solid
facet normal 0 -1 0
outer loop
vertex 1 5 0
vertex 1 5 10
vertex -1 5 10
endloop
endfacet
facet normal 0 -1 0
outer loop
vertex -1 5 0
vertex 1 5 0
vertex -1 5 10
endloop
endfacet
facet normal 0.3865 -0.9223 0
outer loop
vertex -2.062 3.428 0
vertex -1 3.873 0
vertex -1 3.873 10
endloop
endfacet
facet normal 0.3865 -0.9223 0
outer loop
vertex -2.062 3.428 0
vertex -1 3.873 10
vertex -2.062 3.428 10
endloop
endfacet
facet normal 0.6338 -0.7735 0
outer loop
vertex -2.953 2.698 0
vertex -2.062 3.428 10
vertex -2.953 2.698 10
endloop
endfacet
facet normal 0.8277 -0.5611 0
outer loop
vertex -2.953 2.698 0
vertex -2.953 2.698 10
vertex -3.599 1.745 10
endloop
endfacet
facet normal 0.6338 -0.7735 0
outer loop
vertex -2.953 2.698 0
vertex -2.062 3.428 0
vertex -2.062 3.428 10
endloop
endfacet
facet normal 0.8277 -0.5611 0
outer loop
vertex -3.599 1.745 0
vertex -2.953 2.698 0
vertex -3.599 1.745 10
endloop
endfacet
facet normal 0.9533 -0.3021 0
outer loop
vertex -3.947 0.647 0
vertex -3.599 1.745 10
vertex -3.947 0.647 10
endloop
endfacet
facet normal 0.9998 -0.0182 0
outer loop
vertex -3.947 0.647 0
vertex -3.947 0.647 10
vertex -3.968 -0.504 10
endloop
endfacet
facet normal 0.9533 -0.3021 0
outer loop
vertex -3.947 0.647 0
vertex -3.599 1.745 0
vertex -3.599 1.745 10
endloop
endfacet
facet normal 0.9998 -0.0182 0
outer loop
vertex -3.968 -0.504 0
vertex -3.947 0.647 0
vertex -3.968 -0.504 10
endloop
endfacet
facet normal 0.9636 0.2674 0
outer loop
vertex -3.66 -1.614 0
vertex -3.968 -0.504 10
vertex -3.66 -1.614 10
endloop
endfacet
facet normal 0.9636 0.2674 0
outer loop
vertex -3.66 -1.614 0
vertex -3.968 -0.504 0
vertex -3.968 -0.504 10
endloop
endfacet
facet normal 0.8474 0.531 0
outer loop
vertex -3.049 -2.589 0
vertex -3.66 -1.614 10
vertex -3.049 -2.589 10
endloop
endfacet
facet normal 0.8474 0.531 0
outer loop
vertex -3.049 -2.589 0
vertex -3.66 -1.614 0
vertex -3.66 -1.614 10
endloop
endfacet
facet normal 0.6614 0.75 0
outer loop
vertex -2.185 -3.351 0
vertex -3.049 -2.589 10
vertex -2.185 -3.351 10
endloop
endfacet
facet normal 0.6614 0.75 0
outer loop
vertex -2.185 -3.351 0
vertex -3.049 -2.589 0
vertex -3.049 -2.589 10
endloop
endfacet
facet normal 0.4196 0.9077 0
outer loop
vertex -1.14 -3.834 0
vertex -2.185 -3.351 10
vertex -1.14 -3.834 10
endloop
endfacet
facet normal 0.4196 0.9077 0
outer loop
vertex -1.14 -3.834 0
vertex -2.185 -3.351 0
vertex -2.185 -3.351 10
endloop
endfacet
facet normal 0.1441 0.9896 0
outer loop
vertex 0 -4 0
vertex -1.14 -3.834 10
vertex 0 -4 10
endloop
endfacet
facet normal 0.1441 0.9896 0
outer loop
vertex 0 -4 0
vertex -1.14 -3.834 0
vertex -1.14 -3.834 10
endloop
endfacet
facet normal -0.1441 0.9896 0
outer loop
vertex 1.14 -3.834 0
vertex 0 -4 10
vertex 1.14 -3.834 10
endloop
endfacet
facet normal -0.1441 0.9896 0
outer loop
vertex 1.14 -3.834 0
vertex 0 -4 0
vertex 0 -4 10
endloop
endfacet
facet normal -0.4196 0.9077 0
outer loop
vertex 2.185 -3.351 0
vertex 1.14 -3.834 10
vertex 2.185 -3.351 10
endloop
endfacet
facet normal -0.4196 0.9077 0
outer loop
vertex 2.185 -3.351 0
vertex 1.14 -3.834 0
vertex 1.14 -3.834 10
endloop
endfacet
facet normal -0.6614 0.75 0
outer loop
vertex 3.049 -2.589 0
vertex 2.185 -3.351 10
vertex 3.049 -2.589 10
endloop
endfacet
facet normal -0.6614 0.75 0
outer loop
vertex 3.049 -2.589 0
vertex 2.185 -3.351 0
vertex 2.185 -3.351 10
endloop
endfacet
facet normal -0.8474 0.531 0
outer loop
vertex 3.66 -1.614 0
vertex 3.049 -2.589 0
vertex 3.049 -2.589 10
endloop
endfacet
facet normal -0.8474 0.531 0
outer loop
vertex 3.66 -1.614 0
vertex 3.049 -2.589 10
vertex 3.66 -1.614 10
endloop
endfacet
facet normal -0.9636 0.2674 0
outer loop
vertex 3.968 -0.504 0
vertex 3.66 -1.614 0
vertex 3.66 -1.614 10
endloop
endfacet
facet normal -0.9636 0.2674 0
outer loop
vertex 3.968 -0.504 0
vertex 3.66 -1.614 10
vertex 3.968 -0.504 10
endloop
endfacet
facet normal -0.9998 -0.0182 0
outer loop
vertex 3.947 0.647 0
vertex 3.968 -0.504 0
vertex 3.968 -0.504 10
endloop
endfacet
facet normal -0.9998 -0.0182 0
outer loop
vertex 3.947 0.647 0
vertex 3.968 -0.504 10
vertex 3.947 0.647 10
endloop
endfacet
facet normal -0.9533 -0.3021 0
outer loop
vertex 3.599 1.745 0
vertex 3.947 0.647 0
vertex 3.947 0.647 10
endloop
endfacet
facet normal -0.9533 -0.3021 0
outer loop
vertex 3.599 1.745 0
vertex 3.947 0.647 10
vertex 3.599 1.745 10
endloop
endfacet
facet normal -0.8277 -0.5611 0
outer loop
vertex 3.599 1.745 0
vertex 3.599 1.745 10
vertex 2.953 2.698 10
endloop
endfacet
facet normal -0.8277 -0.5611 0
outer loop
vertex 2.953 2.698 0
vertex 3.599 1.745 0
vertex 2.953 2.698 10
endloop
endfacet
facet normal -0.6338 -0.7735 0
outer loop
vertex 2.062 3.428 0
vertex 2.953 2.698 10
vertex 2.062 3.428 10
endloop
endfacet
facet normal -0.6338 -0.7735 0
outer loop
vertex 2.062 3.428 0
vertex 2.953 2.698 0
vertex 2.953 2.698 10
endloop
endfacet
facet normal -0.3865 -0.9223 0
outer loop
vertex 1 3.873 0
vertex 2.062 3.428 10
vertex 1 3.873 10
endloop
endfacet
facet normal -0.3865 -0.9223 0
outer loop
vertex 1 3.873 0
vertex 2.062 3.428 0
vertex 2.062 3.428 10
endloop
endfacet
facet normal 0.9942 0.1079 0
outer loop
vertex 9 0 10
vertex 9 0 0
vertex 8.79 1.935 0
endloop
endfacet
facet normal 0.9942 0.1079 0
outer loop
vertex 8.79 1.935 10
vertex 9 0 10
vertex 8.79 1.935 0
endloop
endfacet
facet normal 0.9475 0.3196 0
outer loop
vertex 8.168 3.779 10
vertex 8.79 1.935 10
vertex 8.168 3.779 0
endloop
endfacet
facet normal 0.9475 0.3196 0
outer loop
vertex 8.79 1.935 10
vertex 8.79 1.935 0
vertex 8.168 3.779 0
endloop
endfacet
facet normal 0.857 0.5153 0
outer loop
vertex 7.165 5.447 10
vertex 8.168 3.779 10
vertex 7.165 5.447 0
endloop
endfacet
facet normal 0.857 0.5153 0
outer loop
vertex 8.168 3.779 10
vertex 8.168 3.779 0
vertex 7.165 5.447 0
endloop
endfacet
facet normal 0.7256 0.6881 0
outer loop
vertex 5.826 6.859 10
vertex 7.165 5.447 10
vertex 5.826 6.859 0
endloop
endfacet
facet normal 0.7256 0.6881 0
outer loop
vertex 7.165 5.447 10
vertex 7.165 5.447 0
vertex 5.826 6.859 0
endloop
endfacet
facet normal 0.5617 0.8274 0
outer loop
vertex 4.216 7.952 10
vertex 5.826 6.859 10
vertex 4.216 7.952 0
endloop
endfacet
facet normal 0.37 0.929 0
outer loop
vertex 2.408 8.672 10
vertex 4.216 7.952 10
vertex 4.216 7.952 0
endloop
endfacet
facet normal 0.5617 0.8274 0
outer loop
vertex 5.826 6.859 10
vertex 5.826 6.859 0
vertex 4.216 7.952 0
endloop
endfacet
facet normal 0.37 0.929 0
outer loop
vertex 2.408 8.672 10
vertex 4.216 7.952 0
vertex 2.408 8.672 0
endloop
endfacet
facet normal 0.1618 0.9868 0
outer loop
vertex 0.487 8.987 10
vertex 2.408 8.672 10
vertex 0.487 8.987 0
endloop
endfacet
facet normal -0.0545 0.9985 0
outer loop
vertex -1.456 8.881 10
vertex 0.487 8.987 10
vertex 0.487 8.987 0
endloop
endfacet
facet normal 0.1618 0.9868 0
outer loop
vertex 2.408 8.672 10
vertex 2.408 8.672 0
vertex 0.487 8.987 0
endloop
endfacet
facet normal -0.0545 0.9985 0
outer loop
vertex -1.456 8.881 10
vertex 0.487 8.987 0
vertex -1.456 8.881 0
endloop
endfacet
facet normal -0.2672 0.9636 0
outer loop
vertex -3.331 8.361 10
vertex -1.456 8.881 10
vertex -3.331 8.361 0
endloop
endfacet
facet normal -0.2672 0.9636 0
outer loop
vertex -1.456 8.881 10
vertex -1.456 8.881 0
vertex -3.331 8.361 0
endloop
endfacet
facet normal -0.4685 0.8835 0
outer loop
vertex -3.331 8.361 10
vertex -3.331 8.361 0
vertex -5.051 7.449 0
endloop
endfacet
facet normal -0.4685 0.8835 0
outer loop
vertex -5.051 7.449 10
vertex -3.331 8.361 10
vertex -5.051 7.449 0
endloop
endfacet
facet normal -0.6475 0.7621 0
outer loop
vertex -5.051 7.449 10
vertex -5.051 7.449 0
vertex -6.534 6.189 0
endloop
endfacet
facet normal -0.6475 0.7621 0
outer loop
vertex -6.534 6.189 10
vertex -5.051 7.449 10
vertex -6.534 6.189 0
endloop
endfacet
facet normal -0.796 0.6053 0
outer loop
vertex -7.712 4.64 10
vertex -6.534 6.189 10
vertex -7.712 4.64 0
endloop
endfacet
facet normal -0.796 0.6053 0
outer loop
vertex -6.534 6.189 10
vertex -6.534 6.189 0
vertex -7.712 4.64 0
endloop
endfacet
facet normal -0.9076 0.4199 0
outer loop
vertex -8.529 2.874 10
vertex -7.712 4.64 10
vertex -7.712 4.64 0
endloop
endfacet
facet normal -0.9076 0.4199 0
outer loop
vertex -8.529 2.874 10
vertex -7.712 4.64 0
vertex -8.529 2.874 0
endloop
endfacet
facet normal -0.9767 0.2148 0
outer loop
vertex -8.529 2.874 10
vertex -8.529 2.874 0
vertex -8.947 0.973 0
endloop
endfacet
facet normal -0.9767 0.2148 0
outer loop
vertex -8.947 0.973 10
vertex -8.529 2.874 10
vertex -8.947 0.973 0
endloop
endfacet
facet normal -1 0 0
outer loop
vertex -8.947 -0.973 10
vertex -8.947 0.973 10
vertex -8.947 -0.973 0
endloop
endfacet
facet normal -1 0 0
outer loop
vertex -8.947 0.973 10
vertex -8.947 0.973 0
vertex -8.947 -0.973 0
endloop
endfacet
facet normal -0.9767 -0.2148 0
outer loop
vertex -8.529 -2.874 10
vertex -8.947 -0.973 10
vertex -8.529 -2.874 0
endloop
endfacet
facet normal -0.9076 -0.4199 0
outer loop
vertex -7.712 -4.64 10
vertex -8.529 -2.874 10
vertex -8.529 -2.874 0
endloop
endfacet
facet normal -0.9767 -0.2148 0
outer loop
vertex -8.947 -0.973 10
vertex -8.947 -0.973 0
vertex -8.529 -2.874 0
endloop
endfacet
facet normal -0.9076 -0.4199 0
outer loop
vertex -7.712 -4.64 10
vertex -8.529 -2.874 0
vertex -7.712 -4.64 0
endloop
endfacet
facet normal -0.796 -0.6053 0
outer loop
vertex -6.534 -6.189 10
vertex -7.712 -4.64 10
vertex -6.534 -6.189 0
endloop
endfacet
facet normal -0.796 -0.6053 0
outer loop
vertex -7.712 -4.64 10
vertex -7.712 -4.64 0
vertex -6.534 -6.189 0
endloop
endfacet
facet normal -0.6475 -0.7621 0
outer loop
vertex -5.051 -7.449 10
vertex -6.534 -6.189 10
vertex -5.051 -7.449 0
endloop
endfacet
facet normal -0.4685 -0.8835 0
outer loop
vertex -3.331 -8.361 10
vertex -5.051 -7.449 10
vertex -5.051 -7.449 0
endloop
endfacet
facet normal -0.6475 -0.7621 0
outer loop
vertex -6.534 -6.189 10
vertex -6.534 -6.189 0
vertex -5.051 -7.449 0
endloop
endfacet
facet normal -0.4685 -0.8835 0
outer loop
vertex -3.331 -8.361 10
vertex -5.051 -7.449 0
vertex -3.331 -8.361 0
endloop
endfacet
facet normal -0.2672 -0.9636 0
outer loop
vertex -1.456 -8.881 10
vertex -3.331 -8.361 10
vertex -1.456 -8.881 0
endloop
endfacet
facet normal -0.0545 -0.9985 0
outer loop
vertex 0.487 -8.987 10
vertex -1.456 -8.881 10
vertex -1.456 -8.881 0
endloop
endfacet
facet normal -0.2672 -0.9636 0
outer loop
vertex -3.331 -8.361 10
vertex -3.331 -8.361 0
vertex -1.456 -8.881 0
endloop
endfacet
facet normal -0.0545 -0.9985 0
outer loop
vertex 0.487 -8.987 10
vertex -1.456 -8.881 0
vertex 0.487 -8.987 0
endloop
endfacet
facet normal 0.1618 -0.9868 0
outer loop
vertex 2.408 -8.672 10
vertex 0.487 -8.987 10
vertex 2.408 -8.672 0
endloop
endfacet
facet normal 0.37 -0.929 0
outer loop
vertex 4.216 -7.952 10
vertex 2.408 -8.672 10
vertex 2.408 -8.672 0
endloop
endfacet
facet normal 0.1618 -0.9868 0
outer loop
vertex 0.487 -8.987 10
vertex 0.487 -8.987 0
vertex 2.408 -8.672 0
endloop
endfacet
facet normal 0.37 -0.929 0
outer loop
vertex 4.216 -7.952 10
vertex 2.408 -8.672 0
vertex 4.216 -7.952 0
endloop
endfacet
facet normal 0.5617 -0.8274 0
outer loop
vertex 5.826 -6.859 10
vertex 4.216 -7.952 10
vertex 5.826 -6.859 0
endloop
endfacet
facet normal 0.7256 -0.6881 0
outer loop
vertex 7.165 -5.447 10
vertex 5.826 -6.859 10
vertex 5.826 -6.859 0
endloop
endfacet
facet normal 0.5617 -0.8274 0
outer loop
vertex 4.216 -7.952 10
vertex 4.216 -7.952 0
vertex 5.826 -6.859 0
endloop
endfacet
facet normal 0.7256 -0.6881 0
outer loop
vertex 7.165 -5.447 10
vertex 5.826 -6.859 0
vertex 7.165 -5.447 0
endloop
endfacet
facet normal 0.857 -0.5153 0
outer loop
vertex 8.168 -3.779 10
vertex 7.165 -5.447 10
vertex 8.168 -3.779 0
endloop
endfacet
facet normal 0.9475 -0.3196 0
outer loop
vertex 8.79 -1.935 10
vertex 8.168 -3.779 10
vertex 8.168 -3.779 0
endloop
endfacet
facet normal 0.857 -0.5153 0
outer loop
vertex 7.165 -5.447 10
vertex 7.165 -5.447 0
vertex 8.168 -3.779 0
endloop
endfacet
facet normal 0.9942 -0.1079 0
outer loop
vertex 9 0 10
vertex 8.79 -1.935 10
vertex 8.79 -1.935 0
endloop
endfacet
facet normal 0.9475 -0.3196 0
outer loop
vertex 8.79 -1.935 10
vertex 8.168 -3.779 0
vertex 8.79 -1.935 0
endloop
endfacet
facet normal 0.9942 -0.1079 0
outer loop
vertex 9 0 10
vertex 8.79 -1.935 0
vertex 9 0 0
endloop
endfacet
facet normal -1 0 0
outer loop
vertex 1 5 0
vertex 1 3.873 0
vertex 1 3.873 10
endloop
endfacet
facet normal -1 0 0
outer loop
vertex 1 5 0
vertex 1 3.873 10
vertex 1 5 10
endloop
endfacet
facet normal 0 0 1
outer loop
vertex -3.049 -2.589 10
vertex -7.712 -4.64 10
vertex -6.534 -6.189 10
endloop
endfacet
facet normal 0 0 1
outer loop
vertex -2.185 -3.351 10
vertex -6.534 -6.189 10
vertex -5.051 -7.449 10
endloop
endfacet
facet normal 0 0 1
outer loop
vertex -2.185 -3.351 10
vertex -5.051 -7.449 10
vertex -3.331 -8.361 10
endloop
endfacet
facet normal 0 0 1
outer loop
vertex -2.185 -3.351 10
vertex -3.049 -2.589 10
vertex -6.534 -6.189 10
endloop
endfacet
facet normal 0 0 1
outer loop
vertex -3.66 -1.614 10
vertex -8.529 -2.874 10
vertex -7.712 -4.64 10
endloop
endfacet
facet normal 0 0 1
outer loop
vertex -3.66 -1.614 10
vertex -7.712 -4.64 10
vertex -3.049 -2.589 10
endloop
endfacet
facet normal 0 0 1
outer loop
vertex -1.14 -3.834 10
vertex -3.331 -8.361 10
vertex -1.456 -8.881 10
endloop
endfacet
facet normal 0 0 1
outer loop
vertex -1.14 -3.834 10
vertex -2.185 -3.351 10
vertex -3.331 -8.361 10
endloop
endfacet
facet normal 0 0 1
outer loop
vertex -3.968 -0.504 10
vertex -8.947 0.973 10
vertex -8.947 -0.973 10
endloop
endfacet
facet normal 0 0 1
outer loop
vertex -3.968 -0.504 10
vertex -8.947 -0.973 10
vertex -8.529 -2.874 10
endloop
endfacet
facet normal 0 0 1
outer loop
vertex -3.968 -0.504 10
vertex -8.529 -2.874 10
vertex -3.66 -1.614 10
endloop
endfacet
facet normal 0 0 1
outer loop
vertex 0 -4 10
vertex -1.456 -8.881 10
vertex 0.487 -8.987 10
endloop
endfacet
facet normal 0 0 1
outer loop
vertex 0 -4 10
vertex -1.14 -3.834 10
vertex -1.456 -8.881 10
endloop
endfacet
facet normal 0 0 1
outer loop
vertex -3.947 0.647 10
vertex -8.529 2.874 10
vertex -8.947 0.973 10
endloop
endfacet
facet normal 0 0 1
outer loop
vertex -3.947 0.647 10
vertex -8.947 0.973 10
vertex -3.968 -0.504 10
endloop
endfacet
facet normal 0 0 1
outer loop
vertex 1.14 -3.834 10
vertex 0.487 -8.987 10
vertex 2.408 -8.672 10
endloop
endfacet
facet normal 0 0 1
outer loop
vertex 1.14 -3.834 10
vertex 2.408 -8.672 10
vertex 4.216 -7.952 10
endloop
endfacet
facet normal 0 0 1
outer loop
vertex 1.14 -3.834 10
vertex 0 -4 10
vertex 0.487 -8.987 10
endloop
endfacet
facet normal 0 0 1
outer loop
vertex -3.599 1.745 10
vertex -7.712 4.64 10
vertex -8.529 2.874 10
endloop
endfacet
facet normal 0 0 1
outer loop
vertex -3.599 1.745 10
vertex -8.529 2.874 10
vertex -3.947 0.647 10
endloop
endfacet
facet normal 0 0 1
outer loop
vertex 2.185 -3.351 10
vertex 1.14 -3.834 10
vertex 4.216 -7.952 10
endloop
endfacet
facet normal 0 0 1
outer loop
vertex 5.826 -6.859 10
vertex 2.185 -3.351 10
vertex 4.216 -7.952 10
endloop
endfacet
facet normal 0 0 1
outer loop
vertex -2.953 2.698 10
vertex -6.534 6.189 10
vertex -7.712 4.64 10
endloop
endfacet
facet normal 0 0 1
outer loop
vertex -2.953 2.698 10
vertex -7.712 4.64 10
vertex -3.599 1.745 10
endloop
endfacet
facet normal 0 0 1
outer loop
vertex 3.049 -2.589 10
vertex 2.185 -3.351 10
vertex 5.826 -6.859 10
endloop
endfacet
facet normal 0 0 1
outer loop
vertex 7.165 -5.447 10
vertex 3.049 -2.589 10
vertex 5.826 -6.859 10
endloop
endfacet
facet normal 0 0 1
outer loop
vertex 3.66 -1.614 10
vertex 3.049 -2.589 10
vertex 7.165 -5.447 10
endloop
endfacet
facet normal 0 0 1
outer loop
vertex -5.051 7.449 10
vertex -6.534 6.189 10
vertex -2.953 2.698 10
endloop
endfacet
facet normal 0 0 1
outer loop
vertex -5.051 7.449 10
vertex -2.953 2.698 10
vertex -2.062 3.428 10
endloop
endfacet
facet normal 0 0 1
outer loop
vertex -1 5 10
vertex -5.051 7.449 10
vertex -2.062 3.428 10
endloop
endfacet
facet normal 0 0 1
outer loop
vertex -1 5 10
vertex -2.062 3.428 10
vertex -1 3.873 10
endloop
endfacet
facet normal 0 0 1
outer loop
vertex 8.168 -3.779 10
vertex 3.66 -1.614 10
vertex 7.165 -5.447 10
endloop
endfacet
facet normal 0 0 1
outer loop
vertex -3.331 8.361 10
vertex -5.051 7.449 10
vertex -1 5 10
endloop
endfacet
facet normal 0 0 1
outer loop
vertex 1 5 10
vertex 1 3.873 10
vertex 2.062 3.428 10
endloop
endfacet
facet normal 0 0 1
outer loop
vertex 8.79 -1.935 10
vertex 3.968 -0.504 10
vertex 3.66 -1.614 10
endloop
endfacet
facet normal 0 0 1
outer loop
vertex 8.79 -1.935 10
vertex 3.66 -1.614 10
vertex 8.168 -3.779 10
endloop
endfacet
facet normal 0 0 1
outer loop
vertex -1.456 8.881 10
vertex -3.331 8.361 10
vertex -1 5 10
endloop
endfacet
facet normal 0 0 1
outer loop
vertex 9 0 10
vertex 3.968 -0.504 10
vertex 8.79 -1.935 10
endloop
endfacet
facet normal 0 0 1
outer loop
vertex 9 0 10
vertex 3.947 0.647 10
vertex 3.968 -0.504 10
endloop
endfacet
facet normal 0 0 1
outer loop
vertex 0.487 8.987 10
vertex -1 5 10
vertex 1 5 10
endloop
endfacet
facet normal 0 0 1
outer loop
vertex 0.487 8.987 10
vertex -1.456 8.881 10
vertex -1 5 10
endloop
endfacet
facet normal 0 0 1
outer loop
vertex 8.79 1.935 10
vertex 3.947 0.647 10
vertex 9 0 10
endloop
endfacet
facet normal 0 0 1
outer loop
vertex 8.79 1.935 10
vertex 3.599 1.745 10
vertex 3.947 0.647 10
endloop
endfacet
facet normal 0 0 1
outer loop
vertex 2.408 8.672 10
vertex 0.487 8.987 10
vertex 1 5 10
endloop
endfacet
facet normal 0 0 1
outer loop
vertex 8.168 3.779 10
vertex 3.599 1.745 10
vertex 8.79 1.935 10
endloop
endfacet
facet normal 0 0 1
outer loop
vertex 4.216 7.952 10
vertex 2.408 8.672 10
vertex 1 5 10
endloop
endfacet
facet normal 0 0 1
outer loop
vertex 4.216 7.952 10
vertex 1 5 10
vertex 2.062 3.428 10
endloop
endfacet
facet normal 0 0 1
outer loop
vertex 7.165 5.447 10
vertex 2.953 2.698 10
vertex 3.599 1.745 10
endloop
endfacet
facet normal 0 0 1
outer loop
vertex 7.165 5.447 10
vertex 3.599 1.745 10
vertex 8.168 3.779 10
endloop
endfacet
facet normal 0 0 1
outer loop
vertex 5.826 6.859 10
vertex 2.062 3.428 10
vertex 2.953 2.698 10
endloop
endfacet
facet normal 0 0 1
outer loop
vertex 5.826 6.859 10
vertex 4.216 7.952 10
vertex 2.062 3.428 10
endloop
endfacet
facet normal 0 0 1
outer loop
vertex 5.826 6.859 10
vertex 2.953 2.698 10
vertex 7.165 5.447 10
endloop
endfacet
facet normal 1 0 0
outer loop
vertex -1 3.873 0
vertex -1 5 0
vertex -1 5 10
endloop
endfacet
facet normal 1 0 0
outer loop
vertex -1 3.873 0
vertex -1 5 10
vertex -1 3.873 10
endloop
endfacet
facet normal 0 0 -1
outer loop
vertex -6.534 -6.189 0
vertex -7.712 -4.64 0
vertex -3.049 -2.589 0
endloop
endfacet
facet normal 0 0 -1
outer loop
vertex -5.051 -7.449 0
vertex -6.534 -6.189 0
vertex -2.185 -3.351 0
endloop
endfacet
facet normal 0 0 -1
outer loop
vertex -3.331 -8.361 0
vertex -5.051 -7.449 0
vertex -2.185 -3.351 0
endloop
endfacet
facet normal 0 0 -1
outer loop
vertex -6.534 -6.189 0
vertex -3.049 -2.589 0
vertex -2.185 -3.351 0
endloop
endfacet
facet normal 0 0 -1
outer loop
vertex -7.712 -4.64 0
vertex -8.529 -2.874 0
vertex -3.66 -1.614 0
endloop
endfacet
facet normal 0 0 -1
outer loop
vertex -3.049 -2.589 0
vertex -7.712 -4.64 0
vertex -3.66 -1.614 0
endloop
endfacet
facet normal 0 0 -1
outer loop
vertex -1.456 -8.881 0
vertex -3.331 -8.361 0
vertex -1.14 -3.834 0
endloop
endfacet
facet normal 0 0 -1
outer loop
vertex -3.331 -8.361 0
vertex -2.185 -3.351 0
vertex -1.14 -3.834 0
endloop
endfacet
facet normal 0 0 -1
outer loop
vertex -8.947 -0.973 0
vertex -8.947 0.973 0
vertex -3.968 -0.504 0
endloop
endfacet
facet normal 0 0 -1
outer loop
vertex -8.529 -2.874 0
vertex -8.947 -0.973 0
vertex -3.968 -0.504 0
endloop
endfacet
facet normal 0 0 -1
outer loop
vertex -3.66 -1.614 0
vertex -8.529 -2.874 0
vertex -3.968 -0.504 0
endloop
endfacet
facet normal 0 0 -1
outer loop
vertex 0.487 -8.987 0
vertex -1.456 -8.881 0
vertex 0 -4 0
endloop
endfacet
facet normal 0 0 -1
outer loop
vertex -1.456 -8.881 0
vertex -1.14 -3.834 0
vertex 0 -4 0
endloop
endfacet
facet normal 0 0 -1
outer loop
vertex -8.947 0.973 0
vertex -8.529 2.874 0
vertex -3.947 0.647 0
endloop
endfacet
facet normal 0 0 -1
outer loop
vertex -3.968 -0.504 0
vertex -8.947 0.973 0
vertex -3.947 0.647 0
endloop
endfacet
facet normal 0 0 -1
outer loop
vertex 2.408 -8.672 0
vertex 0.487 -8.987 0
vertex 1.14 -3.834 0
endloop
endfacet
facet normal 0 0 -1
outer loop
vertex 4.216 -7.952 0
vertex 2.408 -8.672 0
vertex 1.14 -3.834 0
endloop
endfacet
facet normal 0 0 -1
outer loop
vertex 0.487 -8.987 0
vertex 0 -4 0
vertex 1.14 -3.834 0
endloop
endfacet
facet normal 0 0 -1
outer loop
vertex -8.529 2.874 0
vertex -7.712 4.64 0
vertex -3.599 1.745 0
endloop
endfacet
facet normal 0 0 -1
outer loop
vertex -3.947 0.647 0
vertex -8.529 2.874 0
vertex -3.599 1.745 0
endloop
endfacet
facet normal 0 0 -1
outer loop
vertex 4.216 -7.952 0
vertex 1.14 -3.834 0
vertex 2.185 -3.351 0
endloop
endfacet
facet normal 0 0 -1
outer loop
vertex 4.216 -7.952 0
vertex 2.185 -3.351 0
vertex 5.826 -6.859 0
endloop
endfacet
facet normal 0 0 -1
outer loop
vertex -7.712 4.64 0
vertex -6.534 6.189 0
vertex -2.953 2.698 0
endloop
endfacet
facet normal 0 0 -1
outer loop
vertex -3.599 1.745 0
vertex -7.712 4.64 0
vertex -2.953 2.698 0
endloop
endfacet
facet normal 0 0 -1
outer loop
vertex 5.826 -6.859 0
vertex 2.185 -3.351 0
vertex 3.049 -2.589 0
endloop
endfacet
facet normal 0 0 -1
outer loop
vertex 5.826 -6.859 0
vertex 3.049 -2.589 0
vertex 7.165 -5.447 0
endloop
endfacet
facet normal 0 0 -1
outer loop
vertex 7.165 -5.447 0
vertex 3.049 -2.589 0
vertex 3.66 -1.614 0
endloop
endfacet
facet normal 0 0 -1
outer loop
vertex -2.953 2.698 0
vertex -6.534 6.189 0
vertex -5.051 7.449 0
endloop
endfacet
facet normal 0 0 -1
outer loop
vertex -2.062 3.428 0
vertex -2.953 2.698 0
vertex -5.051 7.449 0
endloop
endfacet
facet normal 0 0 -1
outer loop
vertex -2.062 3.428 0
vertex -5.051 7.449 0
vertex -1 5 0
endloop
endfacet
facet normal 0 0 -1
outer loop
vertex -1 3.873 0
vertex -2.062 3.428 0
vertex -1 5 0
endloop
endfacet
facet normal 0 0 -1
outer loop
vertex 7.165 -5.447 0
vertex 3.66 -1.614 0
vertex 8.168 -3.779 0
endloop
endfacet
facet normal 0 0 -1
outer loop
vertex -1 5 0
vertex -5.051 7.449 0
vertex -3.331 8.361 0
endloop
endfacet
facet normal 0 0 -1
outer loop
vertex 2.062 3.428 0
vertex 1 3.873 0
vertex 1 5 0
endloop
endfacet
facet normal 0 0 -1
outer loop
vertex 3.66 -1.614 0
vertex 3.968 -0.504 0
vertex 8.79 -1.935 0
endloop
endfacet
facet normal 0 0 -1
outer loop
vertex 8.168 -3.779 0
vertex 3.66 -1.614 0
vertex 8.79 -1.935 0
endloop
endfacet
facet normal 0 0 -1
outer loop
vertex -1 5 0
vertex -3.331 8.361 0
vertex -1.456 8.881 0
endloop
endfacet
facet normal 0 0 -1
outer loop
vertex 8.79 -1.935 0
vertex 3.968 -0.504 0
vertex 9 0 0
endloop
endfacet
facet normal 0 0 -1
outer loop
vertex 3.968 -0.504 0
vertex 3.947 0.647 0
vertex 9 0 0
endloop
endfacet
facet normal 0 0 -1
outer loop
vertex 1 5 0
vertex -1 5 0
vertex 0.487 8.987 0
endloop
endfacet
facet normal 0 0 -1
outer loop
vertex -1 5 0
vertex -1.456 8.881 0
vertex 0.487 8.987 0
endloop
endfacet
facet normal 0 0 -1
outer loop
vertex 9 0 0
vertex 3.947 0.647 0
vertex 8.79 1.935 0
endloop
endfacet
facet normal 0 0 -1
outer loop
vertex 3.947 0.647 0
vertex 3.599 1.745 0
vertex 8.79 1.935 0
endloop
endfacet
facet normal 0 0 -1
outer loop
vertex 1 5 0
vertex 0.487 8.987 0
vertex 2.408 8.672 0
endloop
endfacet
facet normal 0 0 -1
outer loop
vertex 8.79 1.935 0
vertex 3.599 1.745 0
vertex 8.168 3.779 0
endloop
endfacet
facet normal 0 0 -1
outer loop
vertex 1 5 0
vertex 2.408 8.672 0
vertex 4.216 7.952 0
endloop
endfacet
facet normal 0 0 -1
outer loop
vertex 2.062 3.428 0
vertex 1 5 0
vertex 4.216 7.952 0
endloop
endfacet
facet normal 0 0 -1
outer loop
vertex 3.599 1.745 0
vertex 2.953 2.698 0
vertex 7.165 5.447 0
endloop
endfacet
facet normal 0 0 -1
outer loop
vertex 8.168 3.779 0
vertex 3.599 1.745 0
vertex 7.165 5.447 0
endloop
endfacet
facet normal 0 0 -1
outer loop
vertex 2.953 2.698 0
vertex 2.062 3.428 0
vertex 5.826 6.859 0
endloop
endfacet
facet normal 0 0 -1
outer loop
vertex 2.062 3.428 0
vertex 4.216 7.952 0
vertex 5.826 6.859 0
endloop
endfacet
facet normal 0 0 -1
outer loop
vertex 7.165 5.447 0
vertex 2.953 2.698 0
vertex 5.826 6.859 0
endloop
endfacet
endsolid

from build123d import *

# Parameters (mm, degrees)
SKETCH_1_R      = 9
EXTRUDE_1_DEPTH = 10


with BuildPart() as part:
    # ｽｹｯﾁ1 → ﾎﾞｽ - 押し出し1 (new body)
    with BuildSketch(Plane.XY):
        Circle(SKETCH_1_R)
        with BuildLine():
            Line((-1, 5), (-1, 3.872983346))
            ThreePointArc((-1, 3.872983346), (0, -4), (1, 3.872983346))
            Line((1, 3.872983346), (1, 5))
            Line((1, 5), (-1, 5))
        make_face(mode=Mode.SUBTRACT)
    extrude(amount=EXTRUDE_1_DEPTH)


solid = part.part
